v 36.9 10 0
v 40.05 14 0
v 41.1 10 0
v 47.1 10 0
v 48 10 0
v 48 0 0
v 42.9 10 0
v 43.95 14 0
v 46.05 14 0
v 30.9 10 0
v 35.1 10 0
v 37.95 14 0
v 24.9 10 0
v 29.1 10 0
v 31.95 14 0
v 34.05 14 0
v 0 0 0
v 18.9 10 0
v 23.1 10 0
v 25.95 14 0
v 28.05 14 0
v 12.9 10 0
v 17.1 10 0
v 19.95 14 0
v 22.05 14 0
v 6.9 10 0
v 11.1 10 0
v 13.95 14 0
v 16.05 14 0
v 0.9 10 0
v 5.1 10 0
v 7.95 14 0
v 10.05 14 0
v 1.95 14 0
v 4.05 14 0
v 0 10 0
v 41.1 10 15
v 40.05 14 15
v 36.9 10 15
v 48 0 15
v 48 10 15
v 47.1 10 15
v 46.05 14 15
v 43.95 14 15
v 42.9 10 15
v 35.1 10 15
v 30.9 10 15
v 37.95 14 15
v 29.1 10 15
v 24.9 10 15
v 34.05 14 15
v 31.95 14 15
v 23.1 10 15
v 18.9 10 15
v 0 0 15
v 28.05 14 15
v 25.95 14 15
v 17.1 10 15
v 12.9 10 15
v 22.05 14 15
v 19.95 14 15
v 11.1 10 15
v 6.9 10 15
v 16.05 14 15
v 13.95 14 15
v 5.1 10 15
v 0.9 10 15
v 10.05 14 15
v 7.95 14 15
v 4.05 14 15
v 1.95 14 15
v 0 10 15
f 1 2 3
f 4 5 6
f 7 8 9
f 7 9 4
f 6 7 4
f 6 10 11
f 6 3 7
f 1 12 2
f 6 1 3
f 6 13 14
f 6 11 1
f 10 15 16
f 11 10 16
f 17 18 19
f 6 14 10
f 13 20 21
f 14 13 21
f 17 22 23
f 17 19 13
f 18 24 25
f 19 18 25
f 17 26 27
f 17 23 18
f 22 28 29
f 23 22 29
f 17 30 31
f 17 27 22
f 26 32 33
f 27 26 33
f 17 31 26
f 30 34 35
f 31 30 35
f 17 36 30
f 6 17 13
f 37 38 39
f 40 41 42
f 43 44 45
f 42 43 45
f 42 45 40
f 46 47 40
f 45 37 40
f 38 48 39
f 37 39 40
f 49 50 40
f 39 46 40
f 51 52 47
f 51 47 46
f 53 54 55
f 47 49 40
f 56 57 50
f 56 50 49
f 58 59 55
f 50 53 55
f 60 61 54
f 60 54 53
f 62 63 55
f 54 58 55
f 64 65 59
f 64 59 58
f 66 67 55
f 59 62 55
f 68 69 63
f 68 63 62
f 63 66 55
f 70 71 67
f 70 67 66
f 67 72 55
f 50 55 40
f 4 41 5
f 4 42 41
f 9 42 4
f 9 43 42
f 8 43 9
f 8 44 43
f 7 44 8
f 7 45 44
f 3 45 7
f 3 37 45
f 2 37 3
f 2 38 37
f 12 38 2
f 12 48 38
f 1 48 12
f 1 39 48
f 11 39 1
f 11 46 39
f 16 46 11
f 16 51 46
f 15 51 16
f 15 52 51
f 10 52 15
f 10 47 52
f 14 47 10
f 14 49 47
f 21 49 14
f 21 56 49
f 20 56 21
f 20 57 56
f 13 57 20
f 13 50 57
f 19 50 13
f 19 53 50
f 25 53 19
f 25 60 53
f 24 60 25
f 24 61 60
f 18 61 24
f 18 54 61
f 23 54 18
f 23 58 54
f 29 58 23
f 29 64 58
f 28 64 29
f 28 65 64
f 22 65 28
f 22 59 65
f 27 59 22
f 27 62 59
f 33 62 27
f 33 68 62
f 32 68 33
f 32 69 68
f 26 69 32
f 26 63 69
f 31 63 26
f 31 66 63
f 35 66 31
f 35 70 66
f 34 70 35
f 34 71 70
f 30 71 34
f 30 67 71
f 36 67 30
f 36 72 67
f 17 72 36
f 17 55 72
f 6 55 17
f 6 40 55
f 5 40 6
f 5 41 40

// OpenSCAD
$fn = 32;

// ----------------------------------------------------------------------
// Gear rack: 8 teeth, pitch 6 mm
// ----------------------------------------------------------------------

// --- parameters (mm) ---
teeth = 8;                // number of teeth
pitch = 6;                // tooth pitch, X
root_w = 4.2;             // tooth width at the root
tip_w = 2.1;              // tooth width at the tip
base_h = 10;              // rack body height, Y
tooth_h = 4;              // tooth height above the body
plate_t = 15;             // rack width, Z (extrusion height)

rack_l = teeth * pitch;  // overall length
total_h = base_h + tooth_h;  // overall height

profile = [[0, 0], [48, 0], [48, 10], [47.1, 10], [46.05, 14], [43.95, 14], [42.9, 10], [41.1, 10], [40.05, 14], [37.95, 14], [36.9, 10], [35.1, 10], [34.05, 14], [31.95, 14], [30.9, 10], [29.1, 10], [28.05, 14], [25.95, 14], [24.9, 10], [23.1, 10], [22.05, 14], [19.95, 14], [18.9, 10], [17.1, 10], [16.05, 14], [13.95, 14], [12.9, 10], [11.1, 10], [10.05, 14], [7.95, 14], [6.9, 10], [5.1, 10], [4.05, 14], [1.95, 14], [0.9, 10], [0, 10]];  // primary outline, 36 points, counter clockwise

// --- the one profile operation ---
linear_extrude(height = plate_t) polygon(points = profile);
